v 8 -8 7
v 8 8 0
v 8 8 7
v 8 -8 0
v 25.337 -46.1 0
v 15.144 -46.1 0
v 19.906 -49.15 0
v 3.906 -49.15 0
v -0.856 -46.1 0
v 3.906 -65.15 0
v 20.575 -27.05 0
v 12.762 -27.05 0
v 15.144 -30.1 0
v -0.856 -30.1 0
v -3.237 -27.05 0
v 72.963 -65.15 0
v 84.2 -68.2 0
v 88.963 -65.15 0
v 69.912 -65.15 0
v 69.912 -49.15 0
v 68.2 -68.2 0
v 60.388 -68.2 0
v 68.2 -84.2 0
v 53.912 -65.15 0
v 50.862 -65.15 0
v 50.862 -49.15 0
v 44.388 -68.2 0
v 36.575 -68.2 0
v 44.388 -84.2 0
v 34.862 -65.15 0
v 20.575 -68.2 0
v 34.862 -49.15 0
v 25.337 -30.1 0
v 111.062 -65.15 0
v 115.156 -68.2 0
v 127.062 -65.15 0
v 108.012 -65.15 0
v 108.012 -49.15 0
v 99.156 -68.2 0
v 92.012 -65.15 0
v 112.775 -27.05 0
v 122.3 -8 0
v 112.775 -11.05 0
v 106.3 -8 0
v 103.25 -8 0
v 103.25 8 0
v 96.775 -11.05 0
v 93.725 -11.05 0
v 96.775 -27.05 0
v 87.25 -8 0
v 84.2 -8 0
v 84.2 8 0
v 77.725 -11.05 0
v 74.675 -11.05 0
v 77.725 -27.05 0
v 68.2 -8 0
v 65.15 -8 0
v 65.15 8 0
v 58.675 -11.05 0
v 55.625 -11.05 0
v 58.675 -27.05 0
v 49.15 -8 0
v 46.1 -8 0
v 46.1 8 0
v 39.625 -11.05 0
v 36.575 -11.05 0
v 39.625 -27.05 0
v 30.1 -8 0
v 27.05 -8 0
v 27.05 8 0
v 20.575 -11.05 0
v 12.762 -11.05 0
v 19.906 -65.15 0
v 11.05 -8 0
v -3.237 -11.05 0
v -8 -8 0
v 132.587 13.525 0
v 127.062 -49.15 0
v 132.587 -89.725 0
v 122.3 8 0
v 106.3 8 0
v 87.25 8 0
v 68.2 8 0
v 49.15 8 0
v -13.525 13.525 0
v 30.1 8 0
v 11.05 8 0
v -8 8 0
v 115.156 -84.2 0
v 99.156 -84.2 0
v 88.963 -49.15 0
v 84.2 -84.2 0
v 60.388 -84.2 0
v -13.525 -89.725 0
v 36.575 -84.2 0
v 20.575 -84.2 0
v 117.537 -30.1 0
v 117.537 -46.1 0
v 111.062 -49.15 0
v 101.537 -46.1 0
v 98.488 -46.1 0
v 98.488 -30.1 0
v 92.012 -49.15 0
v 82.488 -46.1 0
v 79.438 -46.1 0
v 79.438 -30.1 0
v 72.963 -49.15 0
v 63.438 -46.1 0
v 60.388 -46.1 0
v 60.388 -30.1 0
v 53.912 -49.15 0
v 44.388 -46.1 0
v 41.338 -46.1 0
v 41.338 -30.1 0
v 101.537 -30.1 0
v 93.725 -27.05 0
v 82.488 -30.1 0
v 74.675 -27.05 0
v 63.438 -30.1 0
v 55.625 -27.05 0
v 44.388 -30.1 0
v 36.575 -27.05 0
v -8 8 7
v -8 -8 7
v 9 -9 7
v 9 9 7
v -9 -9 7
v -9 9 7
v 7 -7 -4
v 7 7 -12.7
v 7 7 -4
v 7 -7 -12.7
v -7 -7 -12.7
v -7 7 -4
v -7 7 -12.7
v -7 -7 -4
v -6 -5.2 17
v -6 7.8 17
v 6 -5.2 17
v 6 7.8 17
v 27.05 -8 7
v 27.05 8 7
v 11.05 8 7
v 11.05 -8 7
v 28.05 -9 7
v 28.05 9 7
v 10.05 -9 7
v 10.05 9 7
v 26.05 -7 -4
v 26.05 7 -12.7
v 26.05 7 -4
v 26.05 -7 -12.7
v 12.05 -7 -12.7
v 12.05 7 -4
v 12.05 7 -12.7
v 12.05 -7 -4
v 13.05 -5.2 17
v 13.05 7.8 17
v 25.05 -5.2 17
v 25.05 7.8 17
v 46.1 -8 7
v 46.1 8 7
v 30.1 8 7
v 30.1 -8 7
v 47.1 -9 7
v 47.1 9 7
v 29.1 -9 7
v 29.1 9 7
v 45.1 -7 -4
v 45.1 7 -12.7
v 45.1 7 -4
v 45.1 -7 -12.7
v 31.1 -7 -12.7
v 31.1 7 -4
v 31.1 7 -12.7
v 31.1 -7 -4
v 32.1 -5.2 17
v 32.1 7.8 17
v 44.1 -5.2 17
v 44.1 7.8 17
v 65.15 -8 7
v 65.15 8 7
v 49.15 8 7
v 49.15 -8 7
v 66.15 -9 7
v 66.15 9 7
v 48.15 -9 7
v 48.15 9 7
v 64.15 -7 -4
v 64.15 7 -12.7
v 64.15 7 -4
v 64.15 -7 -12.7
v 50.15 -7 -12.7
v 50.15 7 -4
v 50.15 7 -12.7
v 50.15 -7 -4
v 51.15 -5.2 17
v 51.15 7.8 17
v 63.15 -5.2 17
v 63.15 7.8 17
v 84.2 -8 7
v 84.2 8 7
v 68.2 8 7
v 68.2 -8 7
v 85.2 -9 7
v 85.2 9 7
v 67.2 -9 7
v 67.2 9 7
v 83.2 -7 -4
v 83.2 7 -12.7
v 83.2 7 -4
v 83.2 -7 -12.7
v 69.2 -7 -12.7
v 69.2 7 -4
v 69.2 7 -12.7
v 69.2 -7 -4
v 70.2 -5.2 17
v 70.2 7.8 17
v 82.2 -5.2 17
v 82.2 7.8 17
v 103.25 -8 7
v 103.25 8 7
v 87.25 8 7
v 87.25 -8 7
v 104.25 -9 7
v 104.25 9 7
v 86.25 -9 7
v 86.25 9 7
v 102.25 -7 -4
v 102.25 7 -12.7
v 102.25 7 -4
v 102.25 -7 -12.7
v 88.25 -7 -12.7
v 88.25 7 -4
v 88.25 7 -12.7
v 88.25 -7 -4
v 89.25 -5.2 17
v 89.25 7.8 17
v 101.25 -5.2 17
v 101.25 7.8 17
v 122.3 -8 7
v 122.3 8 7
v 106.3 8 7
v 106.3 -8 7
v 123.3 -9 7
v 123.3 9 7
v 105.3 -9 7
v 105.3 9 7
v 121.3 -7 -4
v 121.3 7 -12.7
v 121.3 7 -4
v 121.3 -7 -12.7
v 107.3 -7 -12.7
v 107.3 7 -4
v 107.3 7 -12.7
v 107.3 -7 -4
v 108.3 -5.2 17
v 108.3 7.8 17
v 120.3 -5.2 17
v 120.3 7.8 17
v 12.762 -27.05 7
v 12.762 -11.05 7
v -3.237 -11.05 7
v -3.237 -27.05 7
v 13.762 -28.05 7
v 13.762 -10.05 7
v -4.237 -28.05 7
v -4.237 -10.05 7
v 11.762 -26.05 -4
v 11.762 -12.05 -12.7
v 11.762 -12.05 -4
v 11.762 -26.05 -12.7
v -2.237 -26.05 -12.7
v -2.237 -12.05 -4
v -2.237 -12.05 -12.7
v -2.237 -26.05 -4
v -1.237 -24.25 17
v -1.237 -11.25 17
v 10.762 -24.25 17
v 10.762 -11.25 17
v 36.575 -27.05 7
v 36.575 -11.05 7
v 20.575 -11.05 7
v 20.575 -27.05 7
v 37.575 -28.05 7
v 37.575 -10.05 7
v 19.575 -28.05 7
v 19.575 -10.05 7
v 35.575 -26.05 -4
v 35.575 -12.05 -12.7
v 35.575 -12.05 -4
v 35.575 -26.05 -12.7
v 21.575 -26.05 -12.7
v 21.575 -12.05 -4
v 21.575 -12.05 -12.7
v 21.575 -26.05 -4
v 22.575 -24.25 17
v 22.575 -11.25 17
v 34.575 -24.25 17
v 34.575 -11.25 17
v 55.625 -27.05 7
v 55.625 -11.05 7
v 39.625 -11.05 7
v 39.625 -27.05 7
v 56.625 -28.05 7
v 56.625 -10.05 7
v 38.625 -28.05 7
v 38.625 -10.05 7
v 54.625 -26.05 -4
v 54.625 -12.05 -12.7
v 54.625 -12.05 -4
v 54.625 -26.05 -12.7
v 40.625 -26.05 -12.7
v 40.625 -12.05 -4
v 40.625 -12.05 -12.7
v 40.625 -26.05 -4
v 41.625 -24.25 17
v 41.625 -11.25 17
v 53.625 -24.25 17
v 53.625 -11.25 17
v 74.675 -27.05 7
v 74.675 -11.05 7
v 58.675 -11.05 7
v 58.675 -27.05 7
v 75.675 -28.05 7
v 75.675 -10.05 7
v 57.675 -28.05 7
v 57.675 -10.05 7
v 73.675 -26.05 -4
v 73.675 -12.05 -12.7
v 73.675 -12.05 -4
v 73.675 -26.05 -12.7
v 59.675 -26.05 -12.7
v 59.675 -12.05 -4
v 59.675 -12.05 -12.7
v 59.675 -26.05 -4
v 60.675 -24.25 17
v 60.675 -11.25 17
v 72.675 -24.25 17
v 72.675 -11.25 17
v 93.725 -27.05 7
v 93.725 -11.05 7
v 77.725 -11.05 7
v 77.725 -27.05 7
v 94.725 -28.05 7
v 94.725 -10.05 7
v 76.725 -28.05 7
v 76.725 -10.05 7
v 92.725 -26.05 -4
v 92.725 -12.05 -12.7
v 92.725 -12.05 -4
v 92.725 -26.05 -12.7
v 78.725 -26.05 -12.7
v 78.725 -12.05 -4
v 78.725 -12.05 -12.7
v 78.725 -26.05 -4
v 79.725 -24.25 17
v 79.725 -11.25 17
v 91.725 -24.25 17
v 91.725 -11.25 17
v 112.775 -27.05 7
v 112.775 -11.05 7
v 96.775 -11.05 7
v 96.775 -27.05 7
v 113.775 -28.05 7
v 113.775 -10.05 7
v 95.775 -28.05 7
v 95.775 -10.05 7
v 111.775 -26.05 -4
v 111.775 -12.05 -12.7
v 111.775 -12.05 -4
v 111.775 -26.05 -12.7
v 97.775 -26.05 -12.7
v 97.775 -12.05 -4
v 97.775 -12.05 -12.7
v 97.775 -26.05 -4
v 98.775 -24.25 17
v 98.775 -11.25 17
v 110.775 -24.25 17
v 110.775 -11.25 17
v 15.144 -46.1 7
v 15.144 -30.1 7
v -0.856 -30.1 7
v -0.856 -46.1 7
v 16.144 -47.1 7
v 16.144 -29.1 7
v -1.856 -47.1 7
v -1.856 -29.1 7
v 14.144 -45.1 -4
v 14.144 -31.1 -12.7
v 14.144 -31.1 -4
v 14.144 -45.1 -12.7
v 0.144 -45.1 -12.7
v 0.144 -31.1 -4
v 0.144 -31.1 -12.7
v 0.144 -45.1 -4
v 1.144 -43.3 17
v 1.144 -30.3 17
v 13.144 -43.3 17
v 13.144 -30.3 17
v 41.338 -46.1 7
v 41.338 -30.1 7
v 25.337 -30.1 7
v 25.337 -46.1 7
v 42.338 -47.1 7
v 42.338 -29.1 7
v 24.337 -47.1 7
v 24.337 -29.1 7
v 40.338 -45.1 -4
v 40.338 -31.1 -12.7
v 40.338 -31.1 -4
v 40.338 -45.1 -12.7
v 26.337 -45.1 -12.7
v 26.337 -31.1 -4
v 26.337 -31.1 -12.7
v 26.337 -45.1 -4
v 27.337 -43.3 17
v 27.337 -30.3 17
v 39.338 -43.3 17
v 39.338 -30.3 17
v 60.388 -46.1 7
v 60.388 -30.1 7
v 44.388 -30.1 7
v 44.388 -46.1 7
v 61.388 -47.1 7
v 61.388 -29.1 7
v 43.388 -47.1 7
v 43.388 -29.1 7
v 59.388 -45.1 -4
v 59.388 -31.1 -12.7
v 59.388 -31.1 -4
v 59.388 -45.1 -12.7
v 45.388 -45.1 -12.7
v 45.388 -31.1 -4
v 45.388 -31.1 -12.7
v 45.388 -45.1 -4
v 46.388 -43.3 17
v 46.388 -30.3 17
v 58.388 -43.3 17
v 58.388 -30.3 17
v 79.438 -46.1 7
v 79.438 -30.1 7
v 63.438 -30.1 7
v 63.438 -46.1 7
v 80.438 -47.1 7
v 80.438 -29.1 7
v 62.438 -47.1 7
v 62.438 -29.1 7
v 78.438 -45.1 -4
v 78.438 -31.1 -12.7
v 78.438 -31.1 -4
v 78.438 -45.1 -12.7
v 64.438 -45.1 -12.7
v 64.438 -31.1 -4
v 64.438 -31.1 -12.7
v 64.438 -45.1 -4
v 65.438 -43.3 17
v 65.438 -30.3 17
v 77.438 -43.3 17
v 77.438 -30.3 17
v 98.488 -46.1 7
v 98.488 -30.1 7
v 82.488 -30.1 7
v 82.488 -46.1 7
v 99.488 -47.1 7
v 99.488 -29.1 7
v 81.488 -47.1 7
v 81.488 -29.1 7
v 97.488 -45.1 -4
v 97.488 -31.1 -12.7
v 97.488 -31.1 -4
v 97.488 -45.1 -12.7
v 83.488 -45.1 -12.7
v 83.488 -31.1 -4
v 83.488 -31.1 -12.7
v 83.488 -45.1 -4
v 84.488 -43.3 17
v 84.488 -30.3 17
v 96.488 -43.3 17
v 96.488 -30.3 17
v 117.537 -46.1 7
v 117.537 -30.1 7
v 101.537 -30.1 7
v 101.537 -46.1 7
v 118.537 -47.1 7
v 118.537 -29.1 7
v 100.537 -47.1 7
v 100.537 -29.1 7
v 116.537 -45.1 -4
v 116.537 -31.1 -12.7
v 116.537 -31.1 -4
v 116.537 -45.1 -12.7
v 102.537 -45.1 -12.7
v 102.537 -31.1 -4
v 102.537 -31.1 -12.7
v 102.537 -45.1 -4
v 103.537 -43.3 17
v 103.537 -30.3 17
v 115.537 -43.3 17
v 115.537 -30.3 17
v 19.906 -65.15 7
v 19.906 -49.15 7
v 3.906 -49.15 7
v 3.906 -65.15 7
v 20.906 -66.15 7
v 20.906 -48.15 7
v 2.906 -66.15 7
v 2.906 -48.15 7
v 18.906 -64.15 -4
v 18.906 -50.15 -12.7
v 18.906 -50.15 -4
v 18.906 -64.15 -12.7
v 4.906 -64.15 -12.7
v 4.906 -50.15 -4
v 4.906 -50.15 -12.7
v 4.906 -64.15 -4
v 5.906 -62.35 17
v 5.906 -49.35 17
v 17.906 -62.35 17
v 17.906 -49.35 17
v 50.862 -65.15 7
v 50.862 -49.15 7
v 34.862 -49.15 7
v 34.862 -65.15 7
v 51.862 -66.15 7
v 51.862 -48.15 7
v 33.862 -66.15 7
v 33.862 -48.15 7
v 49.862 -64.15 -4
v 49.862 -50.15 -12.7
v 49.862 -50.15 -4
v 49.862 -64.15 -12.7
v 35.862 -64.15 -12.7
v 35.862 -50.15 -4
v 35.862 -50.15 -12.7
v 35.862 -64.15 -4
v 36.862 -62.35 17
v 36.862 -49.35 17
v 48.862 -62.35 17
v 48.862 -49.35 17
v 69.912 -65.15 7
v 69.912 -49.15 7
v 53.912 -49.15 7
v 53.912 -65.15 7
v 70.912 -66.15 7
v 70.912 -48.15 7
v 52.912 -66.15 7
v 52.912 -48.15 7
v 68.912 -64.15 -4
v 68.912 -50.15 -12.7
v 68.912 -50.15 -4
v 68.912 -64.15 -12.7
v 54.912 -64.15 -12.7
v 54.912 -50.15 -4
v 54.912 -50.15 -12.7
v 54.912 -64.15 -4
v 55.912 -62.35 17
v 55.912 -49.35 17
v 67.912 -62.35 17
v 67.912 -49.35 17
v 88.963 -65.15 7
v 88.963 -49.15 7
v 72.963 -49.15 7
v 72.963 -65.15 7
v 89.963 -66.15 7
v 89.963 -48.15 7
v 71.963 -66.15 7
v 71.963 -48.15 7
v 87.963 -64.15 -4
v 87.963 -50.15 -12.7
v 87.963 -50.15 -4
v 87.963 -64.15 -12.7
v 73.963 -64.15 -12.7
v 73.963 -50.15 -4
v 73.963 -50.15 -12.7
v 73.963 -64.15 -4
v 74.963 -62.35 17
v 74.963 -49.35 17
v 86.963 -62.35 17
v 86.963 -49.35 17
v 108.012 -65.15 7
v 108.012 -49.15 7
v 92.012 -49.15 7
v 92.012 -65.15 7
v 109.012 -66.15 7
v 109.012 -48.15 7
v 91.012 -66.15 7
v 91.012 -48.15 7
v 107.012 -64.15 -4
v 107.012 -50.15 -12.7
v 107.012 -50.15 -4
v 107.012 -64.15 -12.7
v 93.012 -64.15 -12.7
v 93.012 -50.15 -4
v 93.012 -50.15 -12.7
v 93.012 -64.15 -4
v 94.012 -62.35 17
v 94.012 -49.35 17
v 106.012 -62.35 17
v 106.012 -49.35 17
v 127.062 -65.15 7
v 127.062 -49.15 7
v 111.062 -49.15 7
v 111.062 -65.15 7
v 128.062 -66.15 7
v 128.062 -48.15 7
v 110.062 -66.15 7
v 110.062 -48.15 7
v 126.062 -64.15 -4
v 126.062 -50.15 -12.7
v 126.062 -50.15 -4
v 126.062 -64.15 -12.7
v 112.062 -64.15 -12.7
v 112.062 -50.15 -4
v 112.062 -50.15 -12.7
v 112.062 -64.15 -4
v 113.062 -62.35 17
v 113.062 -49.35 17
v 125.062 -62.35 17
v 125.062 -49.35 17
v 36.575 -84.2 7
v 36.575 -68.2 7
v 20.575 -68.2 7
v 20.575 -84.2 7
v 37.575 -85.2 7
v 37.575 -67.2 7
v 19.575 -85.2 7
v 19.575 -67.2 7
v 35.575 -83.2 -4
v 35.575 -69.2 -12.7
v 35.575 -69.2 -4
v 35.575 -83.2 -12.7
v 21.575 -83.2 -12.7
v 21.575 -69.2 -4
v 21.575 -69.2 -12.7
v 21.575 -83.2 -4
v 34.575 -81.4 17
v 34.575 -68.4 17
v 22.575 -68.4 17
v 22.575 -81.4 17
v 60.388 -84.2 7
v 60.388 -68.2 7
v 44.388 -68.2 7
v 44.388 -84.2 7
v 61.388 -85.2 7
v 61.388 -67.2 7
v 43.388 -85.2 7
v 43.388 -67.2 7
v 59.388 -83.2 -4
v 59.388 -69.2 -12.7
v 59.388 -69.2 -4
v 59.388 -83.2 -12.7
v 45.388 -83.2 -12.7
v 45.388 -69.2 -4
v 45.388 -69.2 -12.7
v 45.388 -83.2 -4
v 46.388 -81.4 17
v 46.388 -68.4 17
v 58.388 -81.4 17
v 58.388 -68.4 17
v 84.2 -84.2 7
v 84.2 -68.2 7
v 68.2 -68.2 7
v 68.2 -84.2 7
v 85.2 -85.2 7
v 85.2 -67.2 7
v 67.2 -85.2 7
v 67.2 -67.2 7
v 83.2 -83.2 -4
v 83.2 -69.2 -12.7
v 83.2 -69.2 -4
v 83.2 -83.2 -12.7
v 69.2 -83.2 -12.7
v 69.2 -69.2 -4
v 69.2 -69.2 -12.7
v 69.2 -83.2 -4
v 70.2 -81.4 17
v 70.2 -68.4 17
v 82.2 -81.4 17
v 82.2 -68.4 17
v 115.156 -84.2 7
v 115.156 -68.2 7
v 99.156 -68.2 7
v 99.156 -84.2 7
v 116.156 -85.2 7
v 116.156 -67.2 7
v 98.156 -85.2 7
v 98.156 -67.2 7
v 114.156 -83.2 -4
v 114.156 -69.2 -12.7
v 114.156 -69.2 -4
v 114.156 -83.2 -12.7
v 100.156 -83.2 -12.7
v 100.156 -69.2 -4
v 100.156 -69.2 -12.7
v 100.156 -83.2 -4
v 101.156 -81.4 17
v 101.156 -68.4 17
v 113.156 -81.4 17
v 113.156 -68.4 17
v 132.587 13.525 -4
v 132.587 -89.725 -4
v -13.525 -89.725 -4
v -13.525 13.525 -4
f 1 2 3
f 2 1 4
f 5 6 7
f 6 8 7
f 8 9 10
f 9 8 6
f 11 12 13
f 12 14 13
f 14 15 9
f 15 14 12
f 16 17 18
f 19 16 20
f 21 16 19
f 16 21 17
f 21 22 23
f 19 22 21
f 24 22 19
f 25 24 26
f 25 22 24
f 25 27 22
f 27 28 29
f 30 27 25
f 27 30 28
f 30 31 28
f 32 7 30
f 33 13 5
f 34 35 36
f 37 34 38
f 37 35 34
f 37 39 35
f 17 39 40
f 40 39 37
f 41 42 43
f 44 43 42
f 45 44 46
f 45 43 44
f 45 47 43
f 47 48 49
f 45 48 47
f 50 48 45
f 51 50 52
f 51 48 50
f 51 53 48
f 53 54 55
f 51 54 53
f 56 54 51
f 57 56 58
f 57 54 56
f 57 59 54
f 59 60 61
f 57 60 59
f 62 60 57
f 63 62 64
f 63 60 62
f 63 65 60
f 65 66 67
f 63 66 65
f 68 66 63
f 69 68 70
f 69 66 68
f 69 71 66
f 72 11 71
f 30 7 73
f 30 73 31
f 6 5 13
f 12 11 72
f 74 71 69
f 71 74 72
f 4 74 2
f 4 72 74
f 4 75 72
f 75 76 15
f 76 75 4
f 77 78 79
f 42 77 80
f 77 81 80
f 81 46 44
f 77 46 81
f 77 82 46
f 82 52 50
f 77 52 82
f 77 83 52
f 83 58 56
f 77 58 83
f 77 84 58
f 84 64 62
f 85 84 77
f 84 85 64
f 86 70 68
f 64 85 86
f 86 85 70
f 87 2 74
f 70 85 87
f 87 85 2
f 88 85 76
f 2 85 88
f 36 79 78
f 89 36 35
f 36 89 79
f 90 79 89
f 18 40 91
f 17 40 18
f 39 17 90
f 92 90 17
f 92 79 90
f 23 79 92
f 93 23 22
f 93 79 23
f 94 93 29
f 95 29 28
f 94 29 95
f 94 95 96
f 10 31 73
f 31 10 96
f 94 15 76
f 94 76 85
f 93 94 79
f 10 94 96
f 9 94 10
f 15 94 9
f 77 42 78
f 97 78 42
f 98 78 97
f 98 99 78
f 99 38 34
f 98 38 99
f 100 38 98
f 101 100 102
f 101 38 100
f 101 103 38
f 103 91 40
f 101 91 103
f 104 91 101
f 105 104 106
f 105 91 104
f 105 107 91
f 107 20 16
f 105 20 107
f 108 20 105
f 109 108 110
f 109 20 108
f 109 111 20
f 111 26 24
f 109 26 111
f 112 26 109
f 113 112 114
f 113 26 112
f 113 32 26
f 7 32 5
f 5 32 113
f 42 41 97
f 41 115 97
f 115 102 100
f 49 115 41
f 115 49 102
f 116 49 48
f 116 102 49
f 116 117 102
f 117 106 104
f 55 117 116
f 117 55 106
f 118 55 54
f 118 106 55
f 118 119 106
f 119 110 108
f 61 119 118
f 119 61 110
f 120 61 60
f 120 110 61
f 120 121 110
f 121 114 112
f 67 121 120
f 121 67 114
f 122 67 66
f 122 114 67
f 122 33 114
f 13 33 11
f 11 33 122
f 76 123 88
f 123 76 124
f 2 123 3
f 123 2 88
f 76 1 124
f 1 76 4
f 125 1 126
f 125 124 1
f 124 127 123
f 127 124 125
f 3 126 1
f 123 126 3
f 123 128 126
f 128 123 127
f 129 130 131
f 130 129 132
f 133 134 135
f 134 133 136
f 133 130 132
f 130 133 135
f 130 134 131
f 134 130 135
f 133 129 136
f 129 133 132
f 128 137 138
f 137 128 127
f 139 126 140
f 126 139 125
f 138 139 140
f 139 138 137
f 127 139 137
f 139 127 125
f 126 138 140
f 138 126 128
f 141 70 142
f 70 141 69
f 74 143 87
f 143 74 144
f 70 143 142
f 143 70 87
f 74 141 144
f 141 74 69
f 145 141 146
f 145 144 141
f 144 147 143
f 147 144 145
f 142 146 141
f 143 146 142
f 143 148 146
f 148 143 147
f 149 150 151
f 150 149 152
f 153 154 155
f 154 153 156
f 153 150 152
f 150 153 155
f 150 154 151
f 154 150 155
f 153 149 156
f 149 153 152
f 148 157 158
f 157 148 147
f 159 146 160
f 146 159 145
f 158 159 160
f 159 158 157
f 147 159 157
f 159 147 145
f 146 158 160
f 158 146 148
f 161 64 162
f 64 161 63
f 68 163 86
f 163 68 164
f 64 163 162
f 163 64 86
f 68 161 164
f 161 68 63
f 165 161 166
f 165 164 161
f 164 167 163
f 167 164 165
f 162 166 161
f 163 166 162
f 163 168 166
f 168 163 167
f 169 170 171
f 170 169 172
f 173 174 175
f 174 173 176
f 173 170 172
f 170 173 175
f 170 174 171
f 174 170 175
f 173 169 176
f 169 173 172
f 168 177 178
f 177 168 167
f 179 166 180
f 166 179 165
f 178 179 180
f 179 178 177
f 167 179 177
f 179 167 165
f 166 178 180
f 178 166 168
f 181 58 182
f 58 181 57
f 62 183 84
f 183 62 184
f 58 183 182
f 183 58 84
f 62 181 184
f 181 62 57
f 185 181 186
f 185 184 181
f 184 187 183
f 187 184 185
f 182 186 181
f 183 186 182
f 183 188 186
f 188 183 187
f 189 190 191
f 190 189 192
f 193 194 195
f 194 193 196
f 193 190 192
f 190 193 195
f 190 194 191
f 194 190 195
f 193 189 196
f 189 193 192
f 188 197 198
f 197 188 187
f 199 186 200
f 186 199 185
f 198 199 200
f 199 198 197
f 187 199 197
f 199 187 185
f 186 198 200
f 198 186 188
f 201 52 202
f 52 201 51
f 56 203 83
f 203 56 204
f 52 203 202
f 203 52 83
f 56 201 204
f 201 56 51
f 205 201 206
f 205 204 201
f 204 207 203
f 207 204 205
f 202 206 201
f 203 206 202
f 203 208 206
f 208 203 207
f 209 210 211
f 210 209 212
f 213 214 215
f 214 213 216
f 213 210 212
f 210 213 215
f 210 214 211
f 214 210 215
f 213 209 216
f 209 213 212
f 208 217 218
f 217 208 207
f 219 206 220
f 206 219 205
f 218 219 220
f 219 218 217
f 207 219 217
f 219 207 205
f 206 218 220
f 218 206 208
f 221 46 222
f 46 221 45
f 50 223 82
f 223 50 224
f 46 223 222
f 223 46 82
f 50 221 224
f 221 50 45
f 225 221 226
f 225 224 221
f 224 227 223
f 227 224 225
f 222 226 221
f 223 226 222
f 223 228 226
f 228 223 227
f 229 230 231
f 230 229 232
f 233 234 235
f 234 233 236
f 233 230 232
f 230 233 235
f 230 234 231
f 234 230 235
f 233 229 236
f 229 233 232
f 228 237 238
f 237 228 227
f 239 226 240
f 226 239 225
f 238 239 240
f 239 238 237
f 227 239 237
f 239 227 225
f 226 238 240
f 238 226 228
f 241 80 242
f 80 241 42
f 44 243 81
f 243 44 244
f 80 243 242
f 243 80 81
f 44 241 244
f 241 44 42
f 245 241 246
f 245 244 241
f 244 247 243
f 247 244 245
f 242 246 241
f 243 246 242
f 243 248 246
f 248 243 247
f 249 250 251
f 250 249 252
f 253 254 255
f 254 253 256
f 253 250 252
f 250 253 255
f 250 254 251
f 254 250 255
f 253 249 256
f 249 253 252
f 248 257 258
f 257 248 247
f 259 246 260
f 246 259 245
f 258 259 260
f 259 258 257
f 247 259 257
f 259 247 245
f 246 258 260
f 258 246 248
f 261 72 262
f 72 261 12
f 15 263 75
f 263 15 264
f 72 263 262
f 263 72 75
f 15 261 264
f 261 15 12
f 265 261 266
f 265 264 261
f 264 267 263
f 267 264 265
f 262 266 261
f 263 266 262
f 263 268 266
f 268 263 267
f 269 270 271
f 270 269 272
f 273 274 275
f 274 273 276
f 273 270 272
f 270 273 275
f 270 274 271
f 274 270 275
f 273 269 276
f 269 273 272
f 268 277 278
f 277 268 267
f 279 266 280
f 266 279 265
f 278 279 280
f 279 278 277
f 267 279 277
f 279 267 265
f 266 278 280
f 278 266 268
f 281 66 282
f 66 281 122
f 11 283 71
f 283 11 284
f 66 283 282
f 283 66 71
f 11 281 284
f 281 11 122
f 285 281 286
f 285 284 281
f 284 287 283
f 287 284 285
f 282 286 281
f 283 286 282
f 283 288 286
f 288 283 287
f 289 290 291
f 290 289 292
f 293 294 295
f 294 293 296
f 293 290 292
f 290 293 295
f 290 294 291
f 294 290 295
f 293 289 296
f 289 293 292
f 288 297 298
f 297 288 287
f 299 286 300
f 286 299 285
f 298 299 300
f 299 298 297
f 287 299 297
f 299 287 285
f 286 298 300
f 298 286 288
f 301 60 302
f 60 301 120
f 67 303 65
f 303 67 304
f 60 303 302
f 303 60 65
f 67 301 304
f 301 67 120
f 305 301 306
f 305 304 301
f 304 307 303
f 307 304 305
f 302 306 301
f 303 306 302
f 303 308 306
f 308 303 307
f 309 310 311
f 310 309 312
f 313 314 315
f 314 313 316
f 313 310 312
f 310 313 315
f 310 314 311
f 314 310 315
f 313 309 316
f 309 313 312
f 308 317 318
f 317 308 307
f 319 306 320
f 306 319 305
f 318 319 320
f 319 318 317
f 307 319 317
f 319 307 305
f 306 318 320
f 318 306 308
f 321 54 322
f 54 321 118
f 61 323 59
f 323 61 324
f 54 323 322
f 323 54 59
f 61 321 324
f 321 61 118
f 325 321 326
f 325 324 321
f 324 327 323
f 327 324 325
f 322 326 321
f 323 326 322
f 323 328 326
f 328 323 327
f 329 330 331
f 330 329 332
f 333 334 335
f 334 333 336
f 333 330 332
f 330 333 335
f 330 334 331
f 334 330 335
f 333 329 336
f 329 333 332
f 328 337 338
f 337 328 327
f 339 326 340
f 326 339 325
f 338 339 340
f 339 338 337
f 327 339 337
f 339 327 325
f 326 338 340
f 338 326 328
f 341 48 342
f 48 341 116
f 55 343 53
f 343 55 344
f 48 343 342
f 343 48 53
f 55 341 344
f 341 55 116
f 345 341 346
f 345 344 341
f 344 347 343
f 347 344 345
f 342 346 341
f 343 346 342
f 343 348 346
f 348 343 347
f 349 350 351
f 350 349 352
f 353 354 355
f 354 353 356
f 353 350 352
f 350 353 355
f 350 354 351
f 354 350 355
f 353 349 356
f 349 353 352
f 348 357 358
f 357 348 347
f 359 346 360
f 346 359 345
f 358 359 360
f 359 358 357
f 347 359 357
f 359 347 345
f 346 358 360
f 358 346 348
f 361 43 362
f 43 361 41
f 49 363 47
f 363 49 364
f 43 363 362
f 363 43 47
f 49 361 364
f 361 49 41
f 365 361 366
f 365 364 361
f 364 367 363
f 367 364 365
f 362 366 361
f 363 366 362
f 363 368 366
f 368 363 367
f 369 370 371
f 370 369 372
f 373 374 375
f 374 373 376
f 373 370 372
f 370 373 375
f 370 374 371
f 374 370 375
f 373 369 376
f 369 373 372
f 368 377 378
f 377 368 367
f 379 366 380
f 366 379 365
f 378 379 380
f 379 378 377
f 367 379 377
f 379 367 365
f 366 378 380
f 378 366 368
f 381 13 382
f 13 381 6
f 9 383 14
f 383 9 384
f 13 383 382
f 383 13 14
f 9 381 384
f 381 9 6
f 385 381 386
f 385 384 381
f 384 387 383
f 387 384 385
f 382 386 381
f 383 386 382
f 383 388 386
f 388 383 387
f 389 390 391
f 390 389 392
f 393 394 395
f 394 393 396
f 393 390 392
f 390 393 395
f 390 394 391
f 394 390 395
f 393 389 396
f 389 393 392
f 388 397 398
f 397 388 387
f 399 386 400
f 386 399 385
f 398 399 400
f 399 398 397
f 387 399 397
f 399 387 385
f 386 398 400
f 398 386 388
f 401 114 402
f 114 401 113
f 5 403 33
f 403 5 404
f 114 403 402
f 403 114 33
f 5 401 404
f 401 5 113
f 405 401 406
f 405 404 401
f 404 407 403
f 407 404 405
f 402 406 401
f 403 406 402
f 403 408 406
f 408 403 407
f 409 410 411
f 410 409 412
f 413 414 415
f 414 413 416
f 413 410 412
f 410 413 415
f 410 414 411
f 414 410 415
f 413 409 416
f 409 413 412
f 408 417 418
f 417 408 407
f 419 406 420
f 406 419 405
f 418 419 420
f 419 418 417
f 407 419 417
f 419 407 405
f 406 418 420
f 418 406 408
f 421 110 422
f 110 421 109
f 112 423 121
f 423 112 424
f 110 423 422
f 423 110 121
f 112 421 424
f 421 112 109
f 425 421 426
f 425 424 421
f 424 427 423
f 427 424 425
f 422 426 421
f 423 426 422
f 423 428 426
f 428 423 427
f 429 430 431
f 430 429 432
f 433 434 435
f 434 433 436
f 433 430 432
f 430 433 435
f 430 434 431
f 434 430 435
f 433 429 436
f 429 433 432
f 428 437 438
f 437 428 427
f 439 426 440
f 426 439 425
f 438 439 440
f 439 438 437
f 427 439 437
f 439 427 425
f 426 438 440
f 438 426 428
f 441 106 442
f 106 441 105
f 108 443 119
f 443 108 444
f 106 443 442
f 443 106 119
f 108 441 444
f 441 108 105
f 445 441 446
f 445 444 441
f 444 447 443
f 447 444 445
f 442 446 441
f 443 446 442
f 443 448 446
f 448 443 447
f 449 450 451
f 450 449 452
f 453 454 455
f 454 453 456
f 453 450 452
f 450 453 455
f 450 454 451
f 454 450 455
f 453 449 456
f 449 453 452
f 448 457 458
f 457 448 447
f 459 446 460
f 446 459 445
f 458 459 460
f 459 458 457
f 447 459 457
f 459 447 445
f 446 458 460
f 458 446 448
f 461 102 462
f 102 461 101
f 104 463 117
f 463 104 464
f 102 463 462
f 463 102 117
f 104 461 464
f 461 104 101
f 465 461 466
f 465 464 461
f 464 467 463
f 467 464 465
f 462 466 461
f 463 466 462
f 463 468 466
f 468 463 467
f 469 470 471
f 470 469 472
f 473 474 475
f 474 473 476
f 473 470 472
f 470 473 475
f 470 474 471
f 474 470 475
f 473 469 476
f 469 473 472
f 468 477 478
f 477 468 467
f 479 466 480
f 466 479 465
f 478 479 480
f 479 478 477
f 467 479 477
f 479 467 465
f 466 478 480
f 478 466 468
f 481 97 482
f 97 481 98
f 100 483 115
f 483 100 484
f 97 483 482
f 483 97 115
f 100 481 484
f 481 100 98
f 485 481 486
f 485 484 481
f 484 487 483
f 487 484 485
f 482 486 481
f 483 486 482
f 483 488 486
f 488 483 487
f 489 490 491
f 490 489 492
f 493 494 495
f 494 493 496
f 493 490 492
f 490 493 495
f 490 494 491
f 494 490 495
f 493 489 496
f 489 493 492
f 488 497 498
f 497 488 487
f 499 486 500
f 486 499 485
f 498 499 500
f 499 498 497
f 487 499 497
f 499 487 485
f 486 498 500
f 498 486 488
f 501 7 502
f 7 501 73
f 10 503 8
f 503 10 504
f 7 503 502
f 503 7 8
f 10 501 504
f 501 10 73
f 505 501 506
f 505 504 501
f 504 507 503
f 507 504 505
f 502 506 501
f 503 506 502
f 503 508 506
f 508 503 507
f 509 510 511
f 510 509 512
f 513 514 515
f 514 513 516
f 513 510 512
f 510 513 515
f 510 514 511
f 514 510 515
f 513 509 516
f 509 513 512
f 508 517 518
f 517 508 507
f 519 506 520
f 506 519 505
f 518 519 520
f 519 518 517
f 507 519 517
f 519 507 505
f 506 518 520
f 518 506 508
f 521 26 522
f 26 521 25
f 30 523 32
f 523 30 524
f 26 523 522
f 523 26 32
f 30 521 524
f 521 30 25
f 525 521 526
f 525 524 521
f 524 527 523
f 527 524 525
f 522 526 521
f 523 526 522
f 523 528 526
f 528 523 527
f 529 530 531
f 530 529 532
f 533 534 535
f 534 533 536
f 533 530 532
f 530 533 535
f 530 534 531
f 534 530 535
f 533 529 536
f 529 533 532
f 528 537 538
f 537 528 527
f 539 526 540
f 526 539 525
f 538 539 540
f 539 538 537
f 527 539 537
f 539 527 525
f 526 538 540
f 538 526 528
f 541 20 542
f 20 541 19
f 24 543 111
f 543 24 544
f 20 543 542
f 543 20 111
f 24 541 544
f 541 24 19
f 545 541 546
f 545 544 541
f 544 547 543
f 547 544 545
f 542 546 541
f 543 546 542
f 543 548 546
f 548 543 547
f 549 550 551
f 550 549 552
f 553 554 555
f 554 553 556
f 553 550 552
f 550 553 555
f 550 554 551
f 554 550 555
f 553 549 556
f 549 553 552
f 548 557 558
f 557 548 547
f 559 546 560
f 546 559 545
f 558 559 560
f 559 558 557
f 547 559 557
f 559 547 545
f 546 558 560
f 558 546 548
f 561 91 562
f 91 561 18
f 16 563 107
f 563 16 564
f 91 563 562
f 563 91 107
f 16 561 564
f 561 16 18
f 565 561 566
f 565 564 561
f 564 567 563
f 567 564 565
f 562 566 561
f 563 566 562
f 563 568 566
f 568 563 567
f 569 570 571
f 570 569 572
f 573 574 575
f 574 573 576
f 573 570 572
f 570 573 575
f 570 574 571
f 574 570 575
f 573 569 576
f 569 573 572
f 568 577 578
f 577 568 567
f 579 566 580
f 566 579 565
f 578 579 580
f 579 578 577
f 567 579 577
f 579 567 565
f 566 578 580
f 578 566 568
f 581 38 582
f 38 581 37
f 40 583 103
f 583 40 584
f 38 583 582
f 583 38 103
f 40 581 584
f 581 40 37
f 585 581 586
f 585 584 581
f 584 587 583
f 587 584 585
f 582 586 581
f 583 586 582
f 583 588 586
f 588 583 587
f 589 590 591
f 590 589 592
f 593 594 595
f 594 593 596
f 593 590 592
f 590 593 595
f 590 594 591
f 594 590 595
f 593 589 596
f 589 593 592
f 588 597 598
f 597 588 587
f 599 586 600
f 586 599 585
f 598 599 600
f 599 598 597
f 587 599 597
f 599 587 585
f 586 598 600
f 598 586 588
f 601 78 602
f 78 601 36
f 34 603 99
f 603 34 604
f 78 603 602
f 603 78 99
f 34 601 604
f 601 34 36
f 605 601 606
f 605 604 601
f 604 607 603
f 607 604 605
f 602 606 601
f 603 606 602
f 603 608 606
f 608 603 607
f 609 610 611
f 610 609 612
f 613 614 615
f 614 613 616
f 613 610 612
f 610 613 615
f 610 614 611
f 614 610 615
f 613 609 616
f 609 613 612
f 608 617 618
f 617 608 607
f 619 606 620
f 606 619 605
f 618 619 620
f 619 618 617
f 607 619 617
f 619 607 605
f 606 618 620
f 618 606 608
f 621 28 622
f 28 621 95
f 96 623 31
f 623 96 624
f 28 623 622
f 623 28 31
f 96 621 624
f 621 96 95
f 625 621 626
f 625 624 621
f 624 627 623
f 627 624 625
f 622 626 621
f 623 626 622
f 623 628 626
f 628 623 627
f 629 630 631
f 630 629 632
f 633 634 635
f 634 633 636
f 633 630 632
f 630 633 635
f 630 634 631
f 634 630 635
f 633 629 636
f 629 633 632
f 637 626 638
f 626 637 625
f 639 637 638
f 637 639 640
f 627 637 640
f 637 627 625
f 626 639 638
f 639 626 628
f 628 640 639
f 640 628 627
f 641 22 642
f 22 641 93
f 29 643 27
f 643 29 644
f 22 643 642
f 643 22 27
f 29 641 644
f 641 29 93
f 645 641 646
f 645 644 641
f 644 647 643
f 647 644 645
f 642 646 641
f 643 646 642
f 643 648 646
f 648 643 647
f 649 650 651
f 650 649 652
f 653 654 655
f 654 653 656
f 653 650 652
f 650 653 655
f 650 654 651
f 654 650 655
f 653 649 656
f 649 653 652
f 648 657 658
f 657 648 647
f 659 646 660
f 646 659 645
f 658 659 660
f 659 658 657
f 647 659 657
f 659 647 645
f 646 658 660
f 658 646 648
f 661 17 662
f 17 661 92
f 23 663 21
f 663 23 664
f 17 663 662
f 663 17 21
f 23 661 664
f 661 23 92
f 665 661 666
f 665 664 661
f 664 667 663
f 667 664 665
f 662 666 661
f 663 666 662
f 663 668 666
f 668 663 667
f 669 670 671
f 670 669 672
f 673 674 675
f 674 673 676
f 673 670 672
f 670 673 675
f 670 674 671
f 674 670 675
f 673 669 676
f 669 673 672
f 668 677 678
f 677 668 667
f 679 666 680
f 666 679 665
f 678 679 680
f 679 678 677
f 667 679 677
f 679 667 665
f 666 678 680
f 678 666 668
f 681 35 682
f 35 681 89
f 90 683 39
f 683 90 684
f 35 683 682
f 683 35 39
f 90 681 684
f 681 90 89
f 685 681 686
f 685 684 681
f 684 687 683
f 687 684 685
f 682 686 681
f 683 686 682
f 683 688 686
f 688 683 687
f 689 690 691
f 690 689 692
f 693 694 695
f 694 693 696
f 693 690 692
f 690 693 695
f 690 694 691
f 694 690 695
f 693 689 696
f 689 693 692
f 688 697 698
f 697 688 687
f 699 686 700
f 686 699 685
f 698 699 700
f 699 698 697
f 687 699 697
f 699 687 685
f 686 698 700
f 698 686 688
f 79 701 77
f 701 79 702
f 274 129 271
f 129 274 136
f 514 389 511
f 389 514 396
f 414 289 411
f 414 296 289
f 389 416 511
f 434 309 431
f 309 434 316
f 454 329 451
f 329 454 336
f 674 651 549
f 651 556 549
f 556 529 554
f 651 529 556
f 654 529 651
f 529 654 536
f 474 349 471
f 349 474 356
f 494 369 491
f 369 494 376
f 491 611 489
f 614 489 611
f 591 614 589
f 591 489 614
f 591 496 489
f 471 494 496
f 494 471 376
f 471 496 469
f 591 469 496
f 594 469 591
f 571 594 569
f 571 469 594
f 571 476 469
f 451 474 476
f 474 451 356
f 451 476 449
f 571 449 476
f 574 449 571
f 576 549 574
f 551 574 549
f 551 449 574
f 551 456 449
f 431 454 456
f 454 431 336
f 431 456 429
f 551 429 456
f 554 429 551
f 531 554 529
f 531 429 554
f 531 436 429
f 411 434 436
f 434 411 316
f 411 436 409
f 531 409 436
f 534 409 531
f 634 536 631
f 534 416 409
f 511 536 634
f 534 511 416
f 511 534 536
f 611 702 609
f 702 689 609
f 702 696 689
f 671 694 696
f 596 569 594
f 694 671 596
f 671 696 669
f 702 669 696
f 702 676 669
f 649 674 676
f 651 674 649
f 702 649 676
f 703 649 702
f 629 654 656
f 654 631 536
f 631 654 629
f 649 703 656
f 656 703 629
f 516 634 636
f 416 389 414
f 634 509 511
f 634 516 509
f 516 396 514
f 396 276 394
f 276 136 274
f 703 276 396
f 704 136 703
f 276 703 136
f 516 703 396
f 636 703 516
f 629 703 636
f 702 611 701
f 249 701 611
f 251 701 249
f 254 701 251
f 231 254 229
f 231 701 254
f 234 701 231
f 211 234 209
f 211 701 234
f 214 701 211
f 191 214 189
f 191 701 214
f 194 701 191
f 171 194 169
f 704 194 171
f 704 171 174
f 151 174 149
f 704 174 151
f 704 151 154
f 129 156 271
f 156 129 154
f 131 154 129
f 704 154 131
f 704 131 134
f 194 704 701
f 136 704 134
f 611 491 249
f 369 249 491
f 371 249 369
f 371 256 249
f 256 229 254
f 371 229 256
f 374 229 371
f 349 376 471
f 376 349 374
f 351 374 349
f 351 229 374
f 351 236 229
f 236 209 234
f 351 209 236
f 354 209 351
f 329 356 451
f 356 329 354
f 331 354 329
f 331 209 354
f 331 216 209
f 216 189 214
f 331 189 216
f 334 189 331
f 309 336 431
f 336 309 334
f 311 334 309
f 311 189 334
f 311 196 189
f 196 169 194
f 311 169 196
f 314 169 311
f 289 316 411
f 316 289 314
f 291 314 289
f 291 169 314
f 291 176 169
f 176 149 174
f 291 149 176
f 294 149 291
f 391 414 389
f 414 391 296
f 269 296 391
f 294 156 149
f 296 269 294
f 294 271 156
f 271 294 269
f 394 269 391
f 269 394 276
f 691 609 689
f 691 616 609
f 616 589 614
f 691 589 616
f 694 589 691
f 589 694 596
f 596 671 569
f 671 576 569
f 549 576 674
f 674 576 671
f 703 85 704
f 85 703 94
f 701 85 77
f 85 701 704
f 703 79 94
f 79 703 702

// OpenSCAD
w = 19.05;
    
set_plate();
set_key_switches();

module set_plate() {
    plate_w_x = 4 + w / 2 + 6.75 * w + 4;
    plate_w_y = 4 + w / 2 + 4.5 * w + 4;
    plate_h = 4;

    translate([-w / 2 - 4, -plate_w_y + 4 + w / 2, -plate_h]) {
        cube([plate_w_x, plate_w_y, plate_h], center = false);
    }
}

module set_key_switches() {
    // row 1
    y1 = 0;
    for (i = [0:6]) {
        key_switch(i * w, y1);
    }

    // row 2
    y2 = -w;
    key_switch(0.25 * w, y2);
    for (i = [0:4]) {
        key_switch((1.5 + i) * w, y2);
    }

    // row 3
    y3 = -2 * w;
    key_switch(0.375 * w, y3);
    for (i = [0:4]) {
        key_switch((1.75 + i) * w, y3);
    }

    // row 4
    y4 = -3 * w;
    key_switch(0.625 * w, y4);
    for (i = [0:4]) {
        key_switch((2.25 + i) * w, y4);
    }
    
    // row 5
    y5 = -4 * w;
    key_switch(1.5 * w, y5);
    key_switch(2.75 * w, y5);
    key_switch(4 * w, y5);
    key_switch(5.625 * w, y5);
}

module key_switch(x, y) {
    union() {
        h1 = 2;
        translate([x, y, h1 / 2]) {
            cube([16, 16, h1], center=true);
        }
        h2 = 5;
        translate([x, y, h1 + h2 / 2]) {
            cube([16, 16, h2], center=true);
        }
        h3 = 1.2;
        translate([x, y, -h3 / 2]) {
            cube([14, 14, h3], center=true);
        }
        h4 = 1.5;
        translate([x, y, -h3 - h4 / 2]) {
            cube([14, 16, h4], center=true);
        }
        h5 = 10;
        translate([x, y, -h3 - h4 - h5 / 2]) {
            cube([14, 14, h5], center=true);
        }
        key_cap(x, y);
    }
}

module key_cap(x, y) {
    wx1 = 18;
    dx1 = wx1 / 2;

    wy1 = 18;
    dy1 = wy1 / 2;

    wx2 = 12;
    dx2 = wx2 / 2;

    wy2 = 13;
    ry2 = 0.6; // should be greater than 0.5

    z1 = 7;

    z2 = z1 + 10;

    points = [
    [x + dx1, y + dy1, z1], // 0
    [x + dx1, y - dy1, z1], // 1
    [x - dx1, y + dy1, z1], // 2
    [x - dx1, y - dy1, z1], // 3
    [x + dx2, y + ry2 * wy2, z2], // 4
    [x + dx2, y - (1 - ry2) * wy2, z2], // 5
    [x - dx2, y + ry2 * wy2, z2], // 6
    [x - dx2, y - (1 - ry2) * wy2, z2] // 7
    ];
    
    // "All faces must have points ordered in the same direction . OpenSCAD prefers clockwise when looking at each face from outside inwards (from OpenSCAD User Manual/Primitive Solids)"
    faces = [
        [0, 2, 3, 1], // bottom
        [0, 1, 5, 4], // right
        [1, 3, 7, 5], // front
        [3, 2, 6, 7], // left
        [2, 0, 4, 6], // back
        [4, 5, 7, 6]  // top
    ];
    
    polyhedron(points, faces);
}
